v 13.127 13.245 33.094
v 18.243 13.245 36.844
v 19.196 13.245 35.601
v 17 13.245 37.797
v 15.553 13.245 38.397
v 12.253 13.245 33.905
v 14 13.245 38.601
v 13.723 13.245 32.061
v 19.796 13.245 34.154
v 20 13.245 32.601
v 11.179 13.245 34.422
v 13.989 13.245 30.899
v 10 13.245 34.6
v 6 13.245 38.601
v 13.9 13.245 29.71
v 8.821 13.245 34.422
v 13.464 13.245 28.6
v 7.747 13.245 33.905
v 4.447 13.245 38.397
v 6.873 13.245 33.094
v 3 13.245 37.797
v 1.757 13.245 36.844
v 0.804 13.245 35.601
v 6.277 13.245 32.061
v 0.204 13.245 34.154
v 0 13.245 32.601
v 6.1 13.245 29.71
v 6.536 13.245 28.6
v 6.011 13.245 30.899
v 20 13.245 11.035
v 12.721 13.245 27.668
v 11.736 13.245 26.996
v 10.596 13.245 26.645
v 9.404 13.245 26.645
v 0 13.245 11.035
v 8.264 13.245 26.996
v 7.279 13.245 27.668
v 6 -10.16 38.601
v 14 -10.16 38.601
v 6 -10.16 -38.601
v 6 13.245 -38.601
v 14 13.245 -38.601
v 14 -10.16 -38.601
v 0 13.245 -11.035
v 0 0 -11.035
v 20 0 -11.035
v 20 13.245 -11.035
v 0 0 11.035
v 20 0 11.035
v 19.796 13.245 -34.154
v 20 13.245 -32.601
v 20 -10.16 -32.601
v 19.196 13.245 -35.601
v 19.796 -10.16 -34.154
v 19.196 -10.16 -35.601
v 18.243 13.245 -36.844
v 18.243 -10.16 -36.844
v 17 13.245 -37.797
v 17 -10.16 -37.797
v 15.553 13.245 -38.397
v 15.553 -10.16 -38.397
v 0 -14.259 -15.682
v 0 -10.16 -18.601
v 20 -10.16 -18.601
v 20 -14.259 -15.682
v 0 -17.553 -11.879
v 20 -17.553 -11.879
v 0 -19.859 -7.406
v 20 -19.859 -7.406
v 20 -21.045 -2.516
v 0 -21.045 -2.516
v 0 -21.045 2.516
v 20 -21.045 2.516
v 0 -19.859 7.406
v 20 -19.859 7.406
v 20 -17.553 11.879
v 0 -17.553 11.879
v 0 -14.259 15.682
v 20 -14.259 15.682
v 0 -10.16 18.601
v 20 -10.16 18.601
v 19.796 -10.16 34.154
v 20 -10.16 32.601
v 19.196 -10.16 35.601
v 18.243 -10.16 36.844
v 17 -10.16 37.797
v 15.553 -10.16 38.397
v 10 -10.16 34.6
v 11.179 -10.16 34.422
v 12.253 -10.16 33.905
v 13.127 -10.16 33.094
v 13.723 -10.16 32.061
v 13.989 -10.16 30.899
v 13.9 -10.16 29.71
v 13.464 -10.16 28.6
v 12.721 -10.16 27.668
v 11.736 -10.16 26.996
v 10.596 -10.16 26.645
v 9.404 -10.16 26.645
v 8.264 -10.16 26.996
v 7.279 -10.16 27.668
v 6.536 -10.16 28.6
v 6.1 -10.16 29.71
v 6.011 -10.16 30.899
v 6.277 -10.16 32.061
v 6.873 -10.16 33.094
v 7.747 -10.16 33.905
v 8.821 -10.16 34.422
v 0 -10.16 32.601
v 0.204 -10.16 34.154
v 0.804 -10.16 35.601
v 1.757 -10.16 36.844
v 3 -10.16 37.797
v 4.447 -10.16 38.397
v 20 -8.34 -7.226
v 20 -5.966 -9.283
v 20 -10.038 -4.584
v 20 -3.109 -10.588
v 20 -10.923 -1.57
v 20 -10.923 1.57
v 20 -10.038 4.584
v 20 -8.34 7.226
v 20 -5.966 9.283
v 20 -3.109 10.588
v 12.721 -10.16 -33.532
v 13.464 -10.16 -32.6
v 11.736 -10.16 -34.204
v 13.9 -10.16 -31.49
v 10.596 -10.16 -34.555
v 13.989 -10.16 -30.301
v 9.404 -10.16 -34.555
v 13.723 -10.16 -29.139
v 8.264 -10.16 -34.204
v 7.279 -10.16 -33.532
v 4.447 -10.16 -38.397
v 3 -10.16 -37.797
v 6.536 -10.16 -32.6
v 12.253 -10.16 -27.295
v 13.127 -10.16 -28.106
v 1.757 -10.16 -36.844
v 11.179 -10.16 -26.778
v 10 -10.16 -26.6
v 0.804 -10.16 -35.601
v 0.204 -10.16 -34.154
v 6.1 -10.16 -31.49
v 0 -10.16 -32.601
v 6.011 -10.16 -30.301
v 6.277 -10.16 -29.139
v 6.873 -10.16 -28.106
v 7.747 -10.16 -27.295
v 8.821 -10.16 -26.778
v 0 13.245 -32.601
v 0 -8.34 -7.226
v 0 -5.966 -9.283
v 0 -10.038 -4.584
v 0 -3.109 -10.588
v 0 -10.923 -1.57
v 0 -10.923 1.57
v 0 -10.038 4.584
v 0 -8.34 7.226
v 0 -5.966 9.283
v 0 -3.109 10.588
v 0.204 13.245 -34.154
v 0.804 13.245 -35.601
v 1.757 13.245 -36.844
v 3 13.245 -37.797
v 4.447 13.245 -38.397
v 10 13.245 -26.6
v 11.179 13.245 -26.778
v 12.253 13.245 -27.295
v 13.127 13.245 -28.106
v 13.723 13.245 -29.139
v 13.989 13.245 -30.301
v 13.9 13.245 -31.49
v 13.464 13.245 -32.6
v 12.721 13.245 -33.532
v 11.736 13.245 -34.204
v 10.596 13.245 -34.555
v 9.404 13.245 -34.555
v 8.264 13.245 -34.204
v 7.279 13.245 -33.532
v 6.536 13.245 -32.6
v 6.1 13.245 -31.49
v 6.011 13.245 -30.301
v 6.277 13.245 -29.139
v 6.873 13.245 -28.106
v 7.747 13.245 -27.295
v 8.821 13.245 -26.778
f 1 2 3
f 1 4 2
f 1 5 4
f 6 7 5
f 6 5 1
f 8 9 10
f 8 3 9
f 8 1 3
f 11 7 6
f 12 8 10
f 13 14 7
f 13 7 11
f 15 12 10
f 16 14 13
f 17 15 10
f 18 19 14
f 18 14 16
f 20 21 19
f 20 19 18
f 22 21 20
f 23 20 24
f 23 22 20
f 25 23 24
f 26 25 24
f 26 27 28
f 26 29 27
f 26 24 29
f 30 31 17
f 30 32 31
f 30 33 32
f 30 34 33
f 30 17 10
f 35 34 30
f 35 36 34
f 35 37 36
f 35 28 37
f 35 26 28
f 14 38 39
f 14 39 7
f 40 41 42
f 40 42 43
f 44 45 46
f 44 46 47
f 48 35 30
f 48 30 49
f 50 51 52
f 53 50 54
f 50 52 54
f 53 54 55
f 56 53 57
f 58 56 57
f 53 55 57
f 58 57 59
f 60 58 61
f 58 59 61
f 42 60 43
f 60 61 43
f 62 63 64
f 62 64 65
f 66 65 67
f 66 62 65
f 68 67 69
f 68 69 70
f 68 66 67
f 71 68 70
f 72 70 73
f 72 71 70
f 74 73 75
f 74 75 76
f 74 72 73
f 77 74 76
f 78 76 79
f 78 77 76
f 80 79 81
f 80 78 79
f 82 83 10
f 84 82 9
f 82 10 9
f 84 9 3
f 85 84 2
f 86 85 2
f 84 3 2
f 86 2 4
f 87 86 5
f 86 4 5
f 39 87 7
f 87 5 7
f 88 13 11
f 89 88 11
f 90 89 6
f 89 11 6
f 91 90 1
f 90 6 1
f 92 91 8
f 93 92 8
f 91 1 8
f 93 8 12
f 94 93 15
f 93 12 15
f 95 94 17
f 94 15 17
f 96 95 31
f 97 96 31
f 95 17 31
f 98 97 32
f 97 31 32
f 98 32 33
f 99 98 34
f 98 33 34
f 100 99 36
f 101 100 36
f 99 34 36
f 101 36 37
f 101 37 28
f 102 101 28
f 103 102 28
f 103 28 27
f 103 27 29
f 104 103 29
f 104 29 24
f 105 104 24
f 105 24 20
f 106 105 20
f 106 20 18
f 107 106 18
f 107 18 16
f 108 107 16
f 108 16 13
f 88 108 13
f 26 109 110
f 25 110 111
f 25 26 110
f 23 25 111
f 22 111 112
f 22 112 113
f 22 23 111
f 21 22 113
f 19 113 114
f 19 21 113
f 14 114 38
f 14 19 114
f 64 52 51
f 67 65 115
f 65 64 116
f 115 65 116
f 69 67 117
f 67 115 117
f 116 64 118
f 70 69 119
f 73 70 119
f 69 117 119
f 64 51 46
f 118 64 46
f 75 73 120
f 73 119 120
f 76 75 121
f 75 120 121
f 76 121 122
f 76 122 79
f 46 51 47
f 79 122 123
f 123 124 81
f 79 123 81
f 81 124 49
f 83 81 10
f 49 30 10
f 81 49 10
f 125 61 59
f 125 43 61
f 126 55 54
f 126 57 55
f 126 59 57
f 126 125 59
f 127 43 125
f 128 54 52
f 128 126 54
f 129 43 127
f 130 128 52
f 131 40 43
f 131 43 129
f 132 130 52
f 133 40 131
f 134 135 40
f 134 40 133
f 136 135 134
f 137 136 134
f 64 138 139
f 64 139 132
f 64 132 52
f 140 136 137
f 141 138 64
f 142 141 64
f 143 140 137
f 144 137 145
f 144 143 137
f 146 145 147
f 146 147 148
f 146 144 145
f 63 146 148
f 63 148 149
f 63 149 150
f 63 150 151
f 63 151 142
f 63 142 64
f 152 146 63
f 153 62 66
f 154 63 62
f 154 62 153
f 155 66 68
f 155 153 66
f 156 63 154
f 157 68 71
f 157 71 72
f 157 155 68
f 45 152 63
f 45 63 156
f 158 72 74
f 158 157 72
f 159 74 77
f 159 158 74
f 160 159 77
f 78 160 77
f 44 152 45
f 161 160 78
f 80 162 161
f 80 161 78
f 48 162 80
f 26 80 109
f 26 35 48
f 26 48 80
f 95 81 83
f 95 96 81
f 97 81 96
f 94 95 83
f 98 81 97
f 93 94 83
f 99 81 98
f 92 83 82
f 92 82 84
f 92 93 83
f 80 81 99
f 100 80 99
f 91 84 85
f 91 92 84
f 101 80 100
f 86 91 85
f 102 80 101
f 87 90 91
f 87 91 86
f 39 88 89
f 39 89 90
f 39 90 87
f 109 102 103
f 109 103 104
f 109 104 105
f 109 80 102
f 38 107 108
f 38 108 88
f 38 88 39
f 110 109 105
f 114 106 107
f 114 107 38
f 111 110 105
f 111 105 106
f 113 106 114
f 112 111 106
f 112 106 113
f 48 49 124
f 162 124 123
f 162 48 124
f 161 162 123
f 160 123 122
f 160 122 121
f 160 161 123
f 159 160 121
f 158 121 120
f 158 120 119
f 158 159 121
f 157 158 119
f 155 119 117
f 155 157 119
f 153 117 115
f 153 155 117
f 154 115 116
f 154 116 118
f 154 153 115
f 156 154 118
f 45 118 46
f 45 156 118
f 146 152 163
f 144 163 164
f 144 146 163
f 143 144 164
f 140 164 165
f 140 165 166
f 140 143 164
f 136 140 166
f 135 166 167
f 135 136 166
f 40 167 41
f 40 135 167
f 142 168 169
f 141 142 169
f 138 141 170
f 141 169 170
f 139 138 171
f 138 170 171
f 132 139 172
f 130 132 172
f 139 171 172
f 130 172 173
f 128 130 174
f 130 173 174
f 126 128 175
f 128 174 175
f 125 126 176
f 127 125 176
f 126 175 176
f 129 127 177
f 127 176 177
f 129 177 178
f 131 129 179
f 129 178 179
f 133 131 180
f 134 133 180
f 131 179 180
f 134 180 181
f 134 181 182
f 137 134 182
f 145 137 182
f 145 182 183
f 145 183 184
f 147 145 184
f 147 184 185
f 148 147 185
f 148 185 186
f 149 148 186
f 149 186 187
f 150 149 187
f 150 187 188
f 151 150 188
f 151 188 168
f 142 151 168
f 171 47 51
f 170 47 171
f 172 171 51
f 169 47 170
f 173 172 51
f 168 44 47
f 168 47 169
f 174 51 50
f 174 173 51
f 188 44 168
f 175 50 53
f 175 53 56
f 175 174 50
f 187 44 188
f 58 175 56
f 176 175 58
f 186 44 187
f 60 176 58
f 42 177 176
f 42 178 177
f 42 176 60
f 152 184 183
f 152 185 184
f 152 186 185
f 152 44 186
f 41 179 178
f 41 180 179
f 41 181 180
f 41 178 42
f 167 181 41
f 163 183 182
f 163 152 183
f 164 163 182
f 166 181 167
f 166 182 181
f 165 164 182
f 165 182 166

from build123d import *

# Parameters (mm, degrees)
BOSS_EXTRUDE1_DEPTH = 20
CUT_EXTRUDE1_REACH  = 57.463
SKETCH3_R           = 4
FILLET1_R           = 6


with BuildPart() as part:
    # Sketch2 → Boss-Extrude1 (new body)
    with BuildSketch(Plane(origin=(0, 0, 0), x_dir=(0, 0, -1), z_dir=(1, 0, 0))):
        with BuildLine():
            Line((-18.601140422, -10.16), (-38.601140422, -10.16))
            Line((-38.601140422, -10.16), (-38.601140422, 0))
            Line((-38.601140422, 0), (-38.601140422, 13.245))
            Line((-38.601140422, 13.245), (-11.035, 13.245))
            Line((-11.035, 13.245), (-11.035, 0))
            ThreePointArc((-11.035, 0), (0, -11.035), (11.035, 0))
            Line((11.035, 0), (11.035, 13.245))
            Line((11.035, 13.245), (38.601140422, 13.245))
            Line((38.601140422, 13.245), (38.601140422, -10.16))
            Line((38.601140422, -10.16), (18.601140422, -10.16))
            ThreePointArc((18.601140422, -10.16), (0, -21.195), (-18.601140422, -10.16))
        make_face()
    extrude(amount=BOSS_EXTRUDE1_DEPTH)

    # Sketch3 → Cut-Extrude1 (cut, up to next)
    with BuildSketch(Plane(origin=(0, 13.245, 0), x_dir=(1, 0, 0), z_dir=(0, 1, 0)), mode=Mode.PRIVATE) as cut_extrude1_sk1:
        with Locations(Location((10, -30.6, 0), (0, 0, 270))):
            Circle(SKETCH3_R)
    cut_extrude1_tool1 = extrude(cut_extrude1_sk1.sketch, amount=-CUT_EXTRUDE1_REACH, mode=Mode.PRIVATE) & part.part
    # Sketch3 → Cut-Extrude1 (cut, up to next)
    with BuildSketch(Plane(origin=(0, 13.245, 0), x_dir=(1, 0, 0), z_dir=(0, 1, 0)), mode=Mode.PRIVATE) as cut_extrude1_sk2:
        with Locations(Location((10, 30.6, 0), (0, 0, 270))):
            Circle(SKETCH3_R)
    cut_extrude1_tool2 = extrude(cut_extrude1_sk2.sketch, amount=-CUT_EXTRUDE1_REACH, mode=Mode.PRIVATE) & part.part
    add(cut_extrude1_tool1.solids().sort_by_distance((10, 13.245, 30.6))[0], mode=Mode.SUBTRACT)
    add(cut_extrude1_tool2.solids().sort_by_distance((10, 13.245, -30.6))[0], mode=Mode.SUBTRACT)

    # Fillet1
    fillet1_edges = [part.edges().sort_by_distance(p)[0] for p in [
        (0, 1.5425, -38.601140422),
        (0, 1.5425, 38.601140422),
        (20, 1.5425, 38.601140422),
        (20, 1.5425, -38.601140422),
    ]]
    fillet(fillet1_edges, radius=FILLET1_R)


solid = part.part
